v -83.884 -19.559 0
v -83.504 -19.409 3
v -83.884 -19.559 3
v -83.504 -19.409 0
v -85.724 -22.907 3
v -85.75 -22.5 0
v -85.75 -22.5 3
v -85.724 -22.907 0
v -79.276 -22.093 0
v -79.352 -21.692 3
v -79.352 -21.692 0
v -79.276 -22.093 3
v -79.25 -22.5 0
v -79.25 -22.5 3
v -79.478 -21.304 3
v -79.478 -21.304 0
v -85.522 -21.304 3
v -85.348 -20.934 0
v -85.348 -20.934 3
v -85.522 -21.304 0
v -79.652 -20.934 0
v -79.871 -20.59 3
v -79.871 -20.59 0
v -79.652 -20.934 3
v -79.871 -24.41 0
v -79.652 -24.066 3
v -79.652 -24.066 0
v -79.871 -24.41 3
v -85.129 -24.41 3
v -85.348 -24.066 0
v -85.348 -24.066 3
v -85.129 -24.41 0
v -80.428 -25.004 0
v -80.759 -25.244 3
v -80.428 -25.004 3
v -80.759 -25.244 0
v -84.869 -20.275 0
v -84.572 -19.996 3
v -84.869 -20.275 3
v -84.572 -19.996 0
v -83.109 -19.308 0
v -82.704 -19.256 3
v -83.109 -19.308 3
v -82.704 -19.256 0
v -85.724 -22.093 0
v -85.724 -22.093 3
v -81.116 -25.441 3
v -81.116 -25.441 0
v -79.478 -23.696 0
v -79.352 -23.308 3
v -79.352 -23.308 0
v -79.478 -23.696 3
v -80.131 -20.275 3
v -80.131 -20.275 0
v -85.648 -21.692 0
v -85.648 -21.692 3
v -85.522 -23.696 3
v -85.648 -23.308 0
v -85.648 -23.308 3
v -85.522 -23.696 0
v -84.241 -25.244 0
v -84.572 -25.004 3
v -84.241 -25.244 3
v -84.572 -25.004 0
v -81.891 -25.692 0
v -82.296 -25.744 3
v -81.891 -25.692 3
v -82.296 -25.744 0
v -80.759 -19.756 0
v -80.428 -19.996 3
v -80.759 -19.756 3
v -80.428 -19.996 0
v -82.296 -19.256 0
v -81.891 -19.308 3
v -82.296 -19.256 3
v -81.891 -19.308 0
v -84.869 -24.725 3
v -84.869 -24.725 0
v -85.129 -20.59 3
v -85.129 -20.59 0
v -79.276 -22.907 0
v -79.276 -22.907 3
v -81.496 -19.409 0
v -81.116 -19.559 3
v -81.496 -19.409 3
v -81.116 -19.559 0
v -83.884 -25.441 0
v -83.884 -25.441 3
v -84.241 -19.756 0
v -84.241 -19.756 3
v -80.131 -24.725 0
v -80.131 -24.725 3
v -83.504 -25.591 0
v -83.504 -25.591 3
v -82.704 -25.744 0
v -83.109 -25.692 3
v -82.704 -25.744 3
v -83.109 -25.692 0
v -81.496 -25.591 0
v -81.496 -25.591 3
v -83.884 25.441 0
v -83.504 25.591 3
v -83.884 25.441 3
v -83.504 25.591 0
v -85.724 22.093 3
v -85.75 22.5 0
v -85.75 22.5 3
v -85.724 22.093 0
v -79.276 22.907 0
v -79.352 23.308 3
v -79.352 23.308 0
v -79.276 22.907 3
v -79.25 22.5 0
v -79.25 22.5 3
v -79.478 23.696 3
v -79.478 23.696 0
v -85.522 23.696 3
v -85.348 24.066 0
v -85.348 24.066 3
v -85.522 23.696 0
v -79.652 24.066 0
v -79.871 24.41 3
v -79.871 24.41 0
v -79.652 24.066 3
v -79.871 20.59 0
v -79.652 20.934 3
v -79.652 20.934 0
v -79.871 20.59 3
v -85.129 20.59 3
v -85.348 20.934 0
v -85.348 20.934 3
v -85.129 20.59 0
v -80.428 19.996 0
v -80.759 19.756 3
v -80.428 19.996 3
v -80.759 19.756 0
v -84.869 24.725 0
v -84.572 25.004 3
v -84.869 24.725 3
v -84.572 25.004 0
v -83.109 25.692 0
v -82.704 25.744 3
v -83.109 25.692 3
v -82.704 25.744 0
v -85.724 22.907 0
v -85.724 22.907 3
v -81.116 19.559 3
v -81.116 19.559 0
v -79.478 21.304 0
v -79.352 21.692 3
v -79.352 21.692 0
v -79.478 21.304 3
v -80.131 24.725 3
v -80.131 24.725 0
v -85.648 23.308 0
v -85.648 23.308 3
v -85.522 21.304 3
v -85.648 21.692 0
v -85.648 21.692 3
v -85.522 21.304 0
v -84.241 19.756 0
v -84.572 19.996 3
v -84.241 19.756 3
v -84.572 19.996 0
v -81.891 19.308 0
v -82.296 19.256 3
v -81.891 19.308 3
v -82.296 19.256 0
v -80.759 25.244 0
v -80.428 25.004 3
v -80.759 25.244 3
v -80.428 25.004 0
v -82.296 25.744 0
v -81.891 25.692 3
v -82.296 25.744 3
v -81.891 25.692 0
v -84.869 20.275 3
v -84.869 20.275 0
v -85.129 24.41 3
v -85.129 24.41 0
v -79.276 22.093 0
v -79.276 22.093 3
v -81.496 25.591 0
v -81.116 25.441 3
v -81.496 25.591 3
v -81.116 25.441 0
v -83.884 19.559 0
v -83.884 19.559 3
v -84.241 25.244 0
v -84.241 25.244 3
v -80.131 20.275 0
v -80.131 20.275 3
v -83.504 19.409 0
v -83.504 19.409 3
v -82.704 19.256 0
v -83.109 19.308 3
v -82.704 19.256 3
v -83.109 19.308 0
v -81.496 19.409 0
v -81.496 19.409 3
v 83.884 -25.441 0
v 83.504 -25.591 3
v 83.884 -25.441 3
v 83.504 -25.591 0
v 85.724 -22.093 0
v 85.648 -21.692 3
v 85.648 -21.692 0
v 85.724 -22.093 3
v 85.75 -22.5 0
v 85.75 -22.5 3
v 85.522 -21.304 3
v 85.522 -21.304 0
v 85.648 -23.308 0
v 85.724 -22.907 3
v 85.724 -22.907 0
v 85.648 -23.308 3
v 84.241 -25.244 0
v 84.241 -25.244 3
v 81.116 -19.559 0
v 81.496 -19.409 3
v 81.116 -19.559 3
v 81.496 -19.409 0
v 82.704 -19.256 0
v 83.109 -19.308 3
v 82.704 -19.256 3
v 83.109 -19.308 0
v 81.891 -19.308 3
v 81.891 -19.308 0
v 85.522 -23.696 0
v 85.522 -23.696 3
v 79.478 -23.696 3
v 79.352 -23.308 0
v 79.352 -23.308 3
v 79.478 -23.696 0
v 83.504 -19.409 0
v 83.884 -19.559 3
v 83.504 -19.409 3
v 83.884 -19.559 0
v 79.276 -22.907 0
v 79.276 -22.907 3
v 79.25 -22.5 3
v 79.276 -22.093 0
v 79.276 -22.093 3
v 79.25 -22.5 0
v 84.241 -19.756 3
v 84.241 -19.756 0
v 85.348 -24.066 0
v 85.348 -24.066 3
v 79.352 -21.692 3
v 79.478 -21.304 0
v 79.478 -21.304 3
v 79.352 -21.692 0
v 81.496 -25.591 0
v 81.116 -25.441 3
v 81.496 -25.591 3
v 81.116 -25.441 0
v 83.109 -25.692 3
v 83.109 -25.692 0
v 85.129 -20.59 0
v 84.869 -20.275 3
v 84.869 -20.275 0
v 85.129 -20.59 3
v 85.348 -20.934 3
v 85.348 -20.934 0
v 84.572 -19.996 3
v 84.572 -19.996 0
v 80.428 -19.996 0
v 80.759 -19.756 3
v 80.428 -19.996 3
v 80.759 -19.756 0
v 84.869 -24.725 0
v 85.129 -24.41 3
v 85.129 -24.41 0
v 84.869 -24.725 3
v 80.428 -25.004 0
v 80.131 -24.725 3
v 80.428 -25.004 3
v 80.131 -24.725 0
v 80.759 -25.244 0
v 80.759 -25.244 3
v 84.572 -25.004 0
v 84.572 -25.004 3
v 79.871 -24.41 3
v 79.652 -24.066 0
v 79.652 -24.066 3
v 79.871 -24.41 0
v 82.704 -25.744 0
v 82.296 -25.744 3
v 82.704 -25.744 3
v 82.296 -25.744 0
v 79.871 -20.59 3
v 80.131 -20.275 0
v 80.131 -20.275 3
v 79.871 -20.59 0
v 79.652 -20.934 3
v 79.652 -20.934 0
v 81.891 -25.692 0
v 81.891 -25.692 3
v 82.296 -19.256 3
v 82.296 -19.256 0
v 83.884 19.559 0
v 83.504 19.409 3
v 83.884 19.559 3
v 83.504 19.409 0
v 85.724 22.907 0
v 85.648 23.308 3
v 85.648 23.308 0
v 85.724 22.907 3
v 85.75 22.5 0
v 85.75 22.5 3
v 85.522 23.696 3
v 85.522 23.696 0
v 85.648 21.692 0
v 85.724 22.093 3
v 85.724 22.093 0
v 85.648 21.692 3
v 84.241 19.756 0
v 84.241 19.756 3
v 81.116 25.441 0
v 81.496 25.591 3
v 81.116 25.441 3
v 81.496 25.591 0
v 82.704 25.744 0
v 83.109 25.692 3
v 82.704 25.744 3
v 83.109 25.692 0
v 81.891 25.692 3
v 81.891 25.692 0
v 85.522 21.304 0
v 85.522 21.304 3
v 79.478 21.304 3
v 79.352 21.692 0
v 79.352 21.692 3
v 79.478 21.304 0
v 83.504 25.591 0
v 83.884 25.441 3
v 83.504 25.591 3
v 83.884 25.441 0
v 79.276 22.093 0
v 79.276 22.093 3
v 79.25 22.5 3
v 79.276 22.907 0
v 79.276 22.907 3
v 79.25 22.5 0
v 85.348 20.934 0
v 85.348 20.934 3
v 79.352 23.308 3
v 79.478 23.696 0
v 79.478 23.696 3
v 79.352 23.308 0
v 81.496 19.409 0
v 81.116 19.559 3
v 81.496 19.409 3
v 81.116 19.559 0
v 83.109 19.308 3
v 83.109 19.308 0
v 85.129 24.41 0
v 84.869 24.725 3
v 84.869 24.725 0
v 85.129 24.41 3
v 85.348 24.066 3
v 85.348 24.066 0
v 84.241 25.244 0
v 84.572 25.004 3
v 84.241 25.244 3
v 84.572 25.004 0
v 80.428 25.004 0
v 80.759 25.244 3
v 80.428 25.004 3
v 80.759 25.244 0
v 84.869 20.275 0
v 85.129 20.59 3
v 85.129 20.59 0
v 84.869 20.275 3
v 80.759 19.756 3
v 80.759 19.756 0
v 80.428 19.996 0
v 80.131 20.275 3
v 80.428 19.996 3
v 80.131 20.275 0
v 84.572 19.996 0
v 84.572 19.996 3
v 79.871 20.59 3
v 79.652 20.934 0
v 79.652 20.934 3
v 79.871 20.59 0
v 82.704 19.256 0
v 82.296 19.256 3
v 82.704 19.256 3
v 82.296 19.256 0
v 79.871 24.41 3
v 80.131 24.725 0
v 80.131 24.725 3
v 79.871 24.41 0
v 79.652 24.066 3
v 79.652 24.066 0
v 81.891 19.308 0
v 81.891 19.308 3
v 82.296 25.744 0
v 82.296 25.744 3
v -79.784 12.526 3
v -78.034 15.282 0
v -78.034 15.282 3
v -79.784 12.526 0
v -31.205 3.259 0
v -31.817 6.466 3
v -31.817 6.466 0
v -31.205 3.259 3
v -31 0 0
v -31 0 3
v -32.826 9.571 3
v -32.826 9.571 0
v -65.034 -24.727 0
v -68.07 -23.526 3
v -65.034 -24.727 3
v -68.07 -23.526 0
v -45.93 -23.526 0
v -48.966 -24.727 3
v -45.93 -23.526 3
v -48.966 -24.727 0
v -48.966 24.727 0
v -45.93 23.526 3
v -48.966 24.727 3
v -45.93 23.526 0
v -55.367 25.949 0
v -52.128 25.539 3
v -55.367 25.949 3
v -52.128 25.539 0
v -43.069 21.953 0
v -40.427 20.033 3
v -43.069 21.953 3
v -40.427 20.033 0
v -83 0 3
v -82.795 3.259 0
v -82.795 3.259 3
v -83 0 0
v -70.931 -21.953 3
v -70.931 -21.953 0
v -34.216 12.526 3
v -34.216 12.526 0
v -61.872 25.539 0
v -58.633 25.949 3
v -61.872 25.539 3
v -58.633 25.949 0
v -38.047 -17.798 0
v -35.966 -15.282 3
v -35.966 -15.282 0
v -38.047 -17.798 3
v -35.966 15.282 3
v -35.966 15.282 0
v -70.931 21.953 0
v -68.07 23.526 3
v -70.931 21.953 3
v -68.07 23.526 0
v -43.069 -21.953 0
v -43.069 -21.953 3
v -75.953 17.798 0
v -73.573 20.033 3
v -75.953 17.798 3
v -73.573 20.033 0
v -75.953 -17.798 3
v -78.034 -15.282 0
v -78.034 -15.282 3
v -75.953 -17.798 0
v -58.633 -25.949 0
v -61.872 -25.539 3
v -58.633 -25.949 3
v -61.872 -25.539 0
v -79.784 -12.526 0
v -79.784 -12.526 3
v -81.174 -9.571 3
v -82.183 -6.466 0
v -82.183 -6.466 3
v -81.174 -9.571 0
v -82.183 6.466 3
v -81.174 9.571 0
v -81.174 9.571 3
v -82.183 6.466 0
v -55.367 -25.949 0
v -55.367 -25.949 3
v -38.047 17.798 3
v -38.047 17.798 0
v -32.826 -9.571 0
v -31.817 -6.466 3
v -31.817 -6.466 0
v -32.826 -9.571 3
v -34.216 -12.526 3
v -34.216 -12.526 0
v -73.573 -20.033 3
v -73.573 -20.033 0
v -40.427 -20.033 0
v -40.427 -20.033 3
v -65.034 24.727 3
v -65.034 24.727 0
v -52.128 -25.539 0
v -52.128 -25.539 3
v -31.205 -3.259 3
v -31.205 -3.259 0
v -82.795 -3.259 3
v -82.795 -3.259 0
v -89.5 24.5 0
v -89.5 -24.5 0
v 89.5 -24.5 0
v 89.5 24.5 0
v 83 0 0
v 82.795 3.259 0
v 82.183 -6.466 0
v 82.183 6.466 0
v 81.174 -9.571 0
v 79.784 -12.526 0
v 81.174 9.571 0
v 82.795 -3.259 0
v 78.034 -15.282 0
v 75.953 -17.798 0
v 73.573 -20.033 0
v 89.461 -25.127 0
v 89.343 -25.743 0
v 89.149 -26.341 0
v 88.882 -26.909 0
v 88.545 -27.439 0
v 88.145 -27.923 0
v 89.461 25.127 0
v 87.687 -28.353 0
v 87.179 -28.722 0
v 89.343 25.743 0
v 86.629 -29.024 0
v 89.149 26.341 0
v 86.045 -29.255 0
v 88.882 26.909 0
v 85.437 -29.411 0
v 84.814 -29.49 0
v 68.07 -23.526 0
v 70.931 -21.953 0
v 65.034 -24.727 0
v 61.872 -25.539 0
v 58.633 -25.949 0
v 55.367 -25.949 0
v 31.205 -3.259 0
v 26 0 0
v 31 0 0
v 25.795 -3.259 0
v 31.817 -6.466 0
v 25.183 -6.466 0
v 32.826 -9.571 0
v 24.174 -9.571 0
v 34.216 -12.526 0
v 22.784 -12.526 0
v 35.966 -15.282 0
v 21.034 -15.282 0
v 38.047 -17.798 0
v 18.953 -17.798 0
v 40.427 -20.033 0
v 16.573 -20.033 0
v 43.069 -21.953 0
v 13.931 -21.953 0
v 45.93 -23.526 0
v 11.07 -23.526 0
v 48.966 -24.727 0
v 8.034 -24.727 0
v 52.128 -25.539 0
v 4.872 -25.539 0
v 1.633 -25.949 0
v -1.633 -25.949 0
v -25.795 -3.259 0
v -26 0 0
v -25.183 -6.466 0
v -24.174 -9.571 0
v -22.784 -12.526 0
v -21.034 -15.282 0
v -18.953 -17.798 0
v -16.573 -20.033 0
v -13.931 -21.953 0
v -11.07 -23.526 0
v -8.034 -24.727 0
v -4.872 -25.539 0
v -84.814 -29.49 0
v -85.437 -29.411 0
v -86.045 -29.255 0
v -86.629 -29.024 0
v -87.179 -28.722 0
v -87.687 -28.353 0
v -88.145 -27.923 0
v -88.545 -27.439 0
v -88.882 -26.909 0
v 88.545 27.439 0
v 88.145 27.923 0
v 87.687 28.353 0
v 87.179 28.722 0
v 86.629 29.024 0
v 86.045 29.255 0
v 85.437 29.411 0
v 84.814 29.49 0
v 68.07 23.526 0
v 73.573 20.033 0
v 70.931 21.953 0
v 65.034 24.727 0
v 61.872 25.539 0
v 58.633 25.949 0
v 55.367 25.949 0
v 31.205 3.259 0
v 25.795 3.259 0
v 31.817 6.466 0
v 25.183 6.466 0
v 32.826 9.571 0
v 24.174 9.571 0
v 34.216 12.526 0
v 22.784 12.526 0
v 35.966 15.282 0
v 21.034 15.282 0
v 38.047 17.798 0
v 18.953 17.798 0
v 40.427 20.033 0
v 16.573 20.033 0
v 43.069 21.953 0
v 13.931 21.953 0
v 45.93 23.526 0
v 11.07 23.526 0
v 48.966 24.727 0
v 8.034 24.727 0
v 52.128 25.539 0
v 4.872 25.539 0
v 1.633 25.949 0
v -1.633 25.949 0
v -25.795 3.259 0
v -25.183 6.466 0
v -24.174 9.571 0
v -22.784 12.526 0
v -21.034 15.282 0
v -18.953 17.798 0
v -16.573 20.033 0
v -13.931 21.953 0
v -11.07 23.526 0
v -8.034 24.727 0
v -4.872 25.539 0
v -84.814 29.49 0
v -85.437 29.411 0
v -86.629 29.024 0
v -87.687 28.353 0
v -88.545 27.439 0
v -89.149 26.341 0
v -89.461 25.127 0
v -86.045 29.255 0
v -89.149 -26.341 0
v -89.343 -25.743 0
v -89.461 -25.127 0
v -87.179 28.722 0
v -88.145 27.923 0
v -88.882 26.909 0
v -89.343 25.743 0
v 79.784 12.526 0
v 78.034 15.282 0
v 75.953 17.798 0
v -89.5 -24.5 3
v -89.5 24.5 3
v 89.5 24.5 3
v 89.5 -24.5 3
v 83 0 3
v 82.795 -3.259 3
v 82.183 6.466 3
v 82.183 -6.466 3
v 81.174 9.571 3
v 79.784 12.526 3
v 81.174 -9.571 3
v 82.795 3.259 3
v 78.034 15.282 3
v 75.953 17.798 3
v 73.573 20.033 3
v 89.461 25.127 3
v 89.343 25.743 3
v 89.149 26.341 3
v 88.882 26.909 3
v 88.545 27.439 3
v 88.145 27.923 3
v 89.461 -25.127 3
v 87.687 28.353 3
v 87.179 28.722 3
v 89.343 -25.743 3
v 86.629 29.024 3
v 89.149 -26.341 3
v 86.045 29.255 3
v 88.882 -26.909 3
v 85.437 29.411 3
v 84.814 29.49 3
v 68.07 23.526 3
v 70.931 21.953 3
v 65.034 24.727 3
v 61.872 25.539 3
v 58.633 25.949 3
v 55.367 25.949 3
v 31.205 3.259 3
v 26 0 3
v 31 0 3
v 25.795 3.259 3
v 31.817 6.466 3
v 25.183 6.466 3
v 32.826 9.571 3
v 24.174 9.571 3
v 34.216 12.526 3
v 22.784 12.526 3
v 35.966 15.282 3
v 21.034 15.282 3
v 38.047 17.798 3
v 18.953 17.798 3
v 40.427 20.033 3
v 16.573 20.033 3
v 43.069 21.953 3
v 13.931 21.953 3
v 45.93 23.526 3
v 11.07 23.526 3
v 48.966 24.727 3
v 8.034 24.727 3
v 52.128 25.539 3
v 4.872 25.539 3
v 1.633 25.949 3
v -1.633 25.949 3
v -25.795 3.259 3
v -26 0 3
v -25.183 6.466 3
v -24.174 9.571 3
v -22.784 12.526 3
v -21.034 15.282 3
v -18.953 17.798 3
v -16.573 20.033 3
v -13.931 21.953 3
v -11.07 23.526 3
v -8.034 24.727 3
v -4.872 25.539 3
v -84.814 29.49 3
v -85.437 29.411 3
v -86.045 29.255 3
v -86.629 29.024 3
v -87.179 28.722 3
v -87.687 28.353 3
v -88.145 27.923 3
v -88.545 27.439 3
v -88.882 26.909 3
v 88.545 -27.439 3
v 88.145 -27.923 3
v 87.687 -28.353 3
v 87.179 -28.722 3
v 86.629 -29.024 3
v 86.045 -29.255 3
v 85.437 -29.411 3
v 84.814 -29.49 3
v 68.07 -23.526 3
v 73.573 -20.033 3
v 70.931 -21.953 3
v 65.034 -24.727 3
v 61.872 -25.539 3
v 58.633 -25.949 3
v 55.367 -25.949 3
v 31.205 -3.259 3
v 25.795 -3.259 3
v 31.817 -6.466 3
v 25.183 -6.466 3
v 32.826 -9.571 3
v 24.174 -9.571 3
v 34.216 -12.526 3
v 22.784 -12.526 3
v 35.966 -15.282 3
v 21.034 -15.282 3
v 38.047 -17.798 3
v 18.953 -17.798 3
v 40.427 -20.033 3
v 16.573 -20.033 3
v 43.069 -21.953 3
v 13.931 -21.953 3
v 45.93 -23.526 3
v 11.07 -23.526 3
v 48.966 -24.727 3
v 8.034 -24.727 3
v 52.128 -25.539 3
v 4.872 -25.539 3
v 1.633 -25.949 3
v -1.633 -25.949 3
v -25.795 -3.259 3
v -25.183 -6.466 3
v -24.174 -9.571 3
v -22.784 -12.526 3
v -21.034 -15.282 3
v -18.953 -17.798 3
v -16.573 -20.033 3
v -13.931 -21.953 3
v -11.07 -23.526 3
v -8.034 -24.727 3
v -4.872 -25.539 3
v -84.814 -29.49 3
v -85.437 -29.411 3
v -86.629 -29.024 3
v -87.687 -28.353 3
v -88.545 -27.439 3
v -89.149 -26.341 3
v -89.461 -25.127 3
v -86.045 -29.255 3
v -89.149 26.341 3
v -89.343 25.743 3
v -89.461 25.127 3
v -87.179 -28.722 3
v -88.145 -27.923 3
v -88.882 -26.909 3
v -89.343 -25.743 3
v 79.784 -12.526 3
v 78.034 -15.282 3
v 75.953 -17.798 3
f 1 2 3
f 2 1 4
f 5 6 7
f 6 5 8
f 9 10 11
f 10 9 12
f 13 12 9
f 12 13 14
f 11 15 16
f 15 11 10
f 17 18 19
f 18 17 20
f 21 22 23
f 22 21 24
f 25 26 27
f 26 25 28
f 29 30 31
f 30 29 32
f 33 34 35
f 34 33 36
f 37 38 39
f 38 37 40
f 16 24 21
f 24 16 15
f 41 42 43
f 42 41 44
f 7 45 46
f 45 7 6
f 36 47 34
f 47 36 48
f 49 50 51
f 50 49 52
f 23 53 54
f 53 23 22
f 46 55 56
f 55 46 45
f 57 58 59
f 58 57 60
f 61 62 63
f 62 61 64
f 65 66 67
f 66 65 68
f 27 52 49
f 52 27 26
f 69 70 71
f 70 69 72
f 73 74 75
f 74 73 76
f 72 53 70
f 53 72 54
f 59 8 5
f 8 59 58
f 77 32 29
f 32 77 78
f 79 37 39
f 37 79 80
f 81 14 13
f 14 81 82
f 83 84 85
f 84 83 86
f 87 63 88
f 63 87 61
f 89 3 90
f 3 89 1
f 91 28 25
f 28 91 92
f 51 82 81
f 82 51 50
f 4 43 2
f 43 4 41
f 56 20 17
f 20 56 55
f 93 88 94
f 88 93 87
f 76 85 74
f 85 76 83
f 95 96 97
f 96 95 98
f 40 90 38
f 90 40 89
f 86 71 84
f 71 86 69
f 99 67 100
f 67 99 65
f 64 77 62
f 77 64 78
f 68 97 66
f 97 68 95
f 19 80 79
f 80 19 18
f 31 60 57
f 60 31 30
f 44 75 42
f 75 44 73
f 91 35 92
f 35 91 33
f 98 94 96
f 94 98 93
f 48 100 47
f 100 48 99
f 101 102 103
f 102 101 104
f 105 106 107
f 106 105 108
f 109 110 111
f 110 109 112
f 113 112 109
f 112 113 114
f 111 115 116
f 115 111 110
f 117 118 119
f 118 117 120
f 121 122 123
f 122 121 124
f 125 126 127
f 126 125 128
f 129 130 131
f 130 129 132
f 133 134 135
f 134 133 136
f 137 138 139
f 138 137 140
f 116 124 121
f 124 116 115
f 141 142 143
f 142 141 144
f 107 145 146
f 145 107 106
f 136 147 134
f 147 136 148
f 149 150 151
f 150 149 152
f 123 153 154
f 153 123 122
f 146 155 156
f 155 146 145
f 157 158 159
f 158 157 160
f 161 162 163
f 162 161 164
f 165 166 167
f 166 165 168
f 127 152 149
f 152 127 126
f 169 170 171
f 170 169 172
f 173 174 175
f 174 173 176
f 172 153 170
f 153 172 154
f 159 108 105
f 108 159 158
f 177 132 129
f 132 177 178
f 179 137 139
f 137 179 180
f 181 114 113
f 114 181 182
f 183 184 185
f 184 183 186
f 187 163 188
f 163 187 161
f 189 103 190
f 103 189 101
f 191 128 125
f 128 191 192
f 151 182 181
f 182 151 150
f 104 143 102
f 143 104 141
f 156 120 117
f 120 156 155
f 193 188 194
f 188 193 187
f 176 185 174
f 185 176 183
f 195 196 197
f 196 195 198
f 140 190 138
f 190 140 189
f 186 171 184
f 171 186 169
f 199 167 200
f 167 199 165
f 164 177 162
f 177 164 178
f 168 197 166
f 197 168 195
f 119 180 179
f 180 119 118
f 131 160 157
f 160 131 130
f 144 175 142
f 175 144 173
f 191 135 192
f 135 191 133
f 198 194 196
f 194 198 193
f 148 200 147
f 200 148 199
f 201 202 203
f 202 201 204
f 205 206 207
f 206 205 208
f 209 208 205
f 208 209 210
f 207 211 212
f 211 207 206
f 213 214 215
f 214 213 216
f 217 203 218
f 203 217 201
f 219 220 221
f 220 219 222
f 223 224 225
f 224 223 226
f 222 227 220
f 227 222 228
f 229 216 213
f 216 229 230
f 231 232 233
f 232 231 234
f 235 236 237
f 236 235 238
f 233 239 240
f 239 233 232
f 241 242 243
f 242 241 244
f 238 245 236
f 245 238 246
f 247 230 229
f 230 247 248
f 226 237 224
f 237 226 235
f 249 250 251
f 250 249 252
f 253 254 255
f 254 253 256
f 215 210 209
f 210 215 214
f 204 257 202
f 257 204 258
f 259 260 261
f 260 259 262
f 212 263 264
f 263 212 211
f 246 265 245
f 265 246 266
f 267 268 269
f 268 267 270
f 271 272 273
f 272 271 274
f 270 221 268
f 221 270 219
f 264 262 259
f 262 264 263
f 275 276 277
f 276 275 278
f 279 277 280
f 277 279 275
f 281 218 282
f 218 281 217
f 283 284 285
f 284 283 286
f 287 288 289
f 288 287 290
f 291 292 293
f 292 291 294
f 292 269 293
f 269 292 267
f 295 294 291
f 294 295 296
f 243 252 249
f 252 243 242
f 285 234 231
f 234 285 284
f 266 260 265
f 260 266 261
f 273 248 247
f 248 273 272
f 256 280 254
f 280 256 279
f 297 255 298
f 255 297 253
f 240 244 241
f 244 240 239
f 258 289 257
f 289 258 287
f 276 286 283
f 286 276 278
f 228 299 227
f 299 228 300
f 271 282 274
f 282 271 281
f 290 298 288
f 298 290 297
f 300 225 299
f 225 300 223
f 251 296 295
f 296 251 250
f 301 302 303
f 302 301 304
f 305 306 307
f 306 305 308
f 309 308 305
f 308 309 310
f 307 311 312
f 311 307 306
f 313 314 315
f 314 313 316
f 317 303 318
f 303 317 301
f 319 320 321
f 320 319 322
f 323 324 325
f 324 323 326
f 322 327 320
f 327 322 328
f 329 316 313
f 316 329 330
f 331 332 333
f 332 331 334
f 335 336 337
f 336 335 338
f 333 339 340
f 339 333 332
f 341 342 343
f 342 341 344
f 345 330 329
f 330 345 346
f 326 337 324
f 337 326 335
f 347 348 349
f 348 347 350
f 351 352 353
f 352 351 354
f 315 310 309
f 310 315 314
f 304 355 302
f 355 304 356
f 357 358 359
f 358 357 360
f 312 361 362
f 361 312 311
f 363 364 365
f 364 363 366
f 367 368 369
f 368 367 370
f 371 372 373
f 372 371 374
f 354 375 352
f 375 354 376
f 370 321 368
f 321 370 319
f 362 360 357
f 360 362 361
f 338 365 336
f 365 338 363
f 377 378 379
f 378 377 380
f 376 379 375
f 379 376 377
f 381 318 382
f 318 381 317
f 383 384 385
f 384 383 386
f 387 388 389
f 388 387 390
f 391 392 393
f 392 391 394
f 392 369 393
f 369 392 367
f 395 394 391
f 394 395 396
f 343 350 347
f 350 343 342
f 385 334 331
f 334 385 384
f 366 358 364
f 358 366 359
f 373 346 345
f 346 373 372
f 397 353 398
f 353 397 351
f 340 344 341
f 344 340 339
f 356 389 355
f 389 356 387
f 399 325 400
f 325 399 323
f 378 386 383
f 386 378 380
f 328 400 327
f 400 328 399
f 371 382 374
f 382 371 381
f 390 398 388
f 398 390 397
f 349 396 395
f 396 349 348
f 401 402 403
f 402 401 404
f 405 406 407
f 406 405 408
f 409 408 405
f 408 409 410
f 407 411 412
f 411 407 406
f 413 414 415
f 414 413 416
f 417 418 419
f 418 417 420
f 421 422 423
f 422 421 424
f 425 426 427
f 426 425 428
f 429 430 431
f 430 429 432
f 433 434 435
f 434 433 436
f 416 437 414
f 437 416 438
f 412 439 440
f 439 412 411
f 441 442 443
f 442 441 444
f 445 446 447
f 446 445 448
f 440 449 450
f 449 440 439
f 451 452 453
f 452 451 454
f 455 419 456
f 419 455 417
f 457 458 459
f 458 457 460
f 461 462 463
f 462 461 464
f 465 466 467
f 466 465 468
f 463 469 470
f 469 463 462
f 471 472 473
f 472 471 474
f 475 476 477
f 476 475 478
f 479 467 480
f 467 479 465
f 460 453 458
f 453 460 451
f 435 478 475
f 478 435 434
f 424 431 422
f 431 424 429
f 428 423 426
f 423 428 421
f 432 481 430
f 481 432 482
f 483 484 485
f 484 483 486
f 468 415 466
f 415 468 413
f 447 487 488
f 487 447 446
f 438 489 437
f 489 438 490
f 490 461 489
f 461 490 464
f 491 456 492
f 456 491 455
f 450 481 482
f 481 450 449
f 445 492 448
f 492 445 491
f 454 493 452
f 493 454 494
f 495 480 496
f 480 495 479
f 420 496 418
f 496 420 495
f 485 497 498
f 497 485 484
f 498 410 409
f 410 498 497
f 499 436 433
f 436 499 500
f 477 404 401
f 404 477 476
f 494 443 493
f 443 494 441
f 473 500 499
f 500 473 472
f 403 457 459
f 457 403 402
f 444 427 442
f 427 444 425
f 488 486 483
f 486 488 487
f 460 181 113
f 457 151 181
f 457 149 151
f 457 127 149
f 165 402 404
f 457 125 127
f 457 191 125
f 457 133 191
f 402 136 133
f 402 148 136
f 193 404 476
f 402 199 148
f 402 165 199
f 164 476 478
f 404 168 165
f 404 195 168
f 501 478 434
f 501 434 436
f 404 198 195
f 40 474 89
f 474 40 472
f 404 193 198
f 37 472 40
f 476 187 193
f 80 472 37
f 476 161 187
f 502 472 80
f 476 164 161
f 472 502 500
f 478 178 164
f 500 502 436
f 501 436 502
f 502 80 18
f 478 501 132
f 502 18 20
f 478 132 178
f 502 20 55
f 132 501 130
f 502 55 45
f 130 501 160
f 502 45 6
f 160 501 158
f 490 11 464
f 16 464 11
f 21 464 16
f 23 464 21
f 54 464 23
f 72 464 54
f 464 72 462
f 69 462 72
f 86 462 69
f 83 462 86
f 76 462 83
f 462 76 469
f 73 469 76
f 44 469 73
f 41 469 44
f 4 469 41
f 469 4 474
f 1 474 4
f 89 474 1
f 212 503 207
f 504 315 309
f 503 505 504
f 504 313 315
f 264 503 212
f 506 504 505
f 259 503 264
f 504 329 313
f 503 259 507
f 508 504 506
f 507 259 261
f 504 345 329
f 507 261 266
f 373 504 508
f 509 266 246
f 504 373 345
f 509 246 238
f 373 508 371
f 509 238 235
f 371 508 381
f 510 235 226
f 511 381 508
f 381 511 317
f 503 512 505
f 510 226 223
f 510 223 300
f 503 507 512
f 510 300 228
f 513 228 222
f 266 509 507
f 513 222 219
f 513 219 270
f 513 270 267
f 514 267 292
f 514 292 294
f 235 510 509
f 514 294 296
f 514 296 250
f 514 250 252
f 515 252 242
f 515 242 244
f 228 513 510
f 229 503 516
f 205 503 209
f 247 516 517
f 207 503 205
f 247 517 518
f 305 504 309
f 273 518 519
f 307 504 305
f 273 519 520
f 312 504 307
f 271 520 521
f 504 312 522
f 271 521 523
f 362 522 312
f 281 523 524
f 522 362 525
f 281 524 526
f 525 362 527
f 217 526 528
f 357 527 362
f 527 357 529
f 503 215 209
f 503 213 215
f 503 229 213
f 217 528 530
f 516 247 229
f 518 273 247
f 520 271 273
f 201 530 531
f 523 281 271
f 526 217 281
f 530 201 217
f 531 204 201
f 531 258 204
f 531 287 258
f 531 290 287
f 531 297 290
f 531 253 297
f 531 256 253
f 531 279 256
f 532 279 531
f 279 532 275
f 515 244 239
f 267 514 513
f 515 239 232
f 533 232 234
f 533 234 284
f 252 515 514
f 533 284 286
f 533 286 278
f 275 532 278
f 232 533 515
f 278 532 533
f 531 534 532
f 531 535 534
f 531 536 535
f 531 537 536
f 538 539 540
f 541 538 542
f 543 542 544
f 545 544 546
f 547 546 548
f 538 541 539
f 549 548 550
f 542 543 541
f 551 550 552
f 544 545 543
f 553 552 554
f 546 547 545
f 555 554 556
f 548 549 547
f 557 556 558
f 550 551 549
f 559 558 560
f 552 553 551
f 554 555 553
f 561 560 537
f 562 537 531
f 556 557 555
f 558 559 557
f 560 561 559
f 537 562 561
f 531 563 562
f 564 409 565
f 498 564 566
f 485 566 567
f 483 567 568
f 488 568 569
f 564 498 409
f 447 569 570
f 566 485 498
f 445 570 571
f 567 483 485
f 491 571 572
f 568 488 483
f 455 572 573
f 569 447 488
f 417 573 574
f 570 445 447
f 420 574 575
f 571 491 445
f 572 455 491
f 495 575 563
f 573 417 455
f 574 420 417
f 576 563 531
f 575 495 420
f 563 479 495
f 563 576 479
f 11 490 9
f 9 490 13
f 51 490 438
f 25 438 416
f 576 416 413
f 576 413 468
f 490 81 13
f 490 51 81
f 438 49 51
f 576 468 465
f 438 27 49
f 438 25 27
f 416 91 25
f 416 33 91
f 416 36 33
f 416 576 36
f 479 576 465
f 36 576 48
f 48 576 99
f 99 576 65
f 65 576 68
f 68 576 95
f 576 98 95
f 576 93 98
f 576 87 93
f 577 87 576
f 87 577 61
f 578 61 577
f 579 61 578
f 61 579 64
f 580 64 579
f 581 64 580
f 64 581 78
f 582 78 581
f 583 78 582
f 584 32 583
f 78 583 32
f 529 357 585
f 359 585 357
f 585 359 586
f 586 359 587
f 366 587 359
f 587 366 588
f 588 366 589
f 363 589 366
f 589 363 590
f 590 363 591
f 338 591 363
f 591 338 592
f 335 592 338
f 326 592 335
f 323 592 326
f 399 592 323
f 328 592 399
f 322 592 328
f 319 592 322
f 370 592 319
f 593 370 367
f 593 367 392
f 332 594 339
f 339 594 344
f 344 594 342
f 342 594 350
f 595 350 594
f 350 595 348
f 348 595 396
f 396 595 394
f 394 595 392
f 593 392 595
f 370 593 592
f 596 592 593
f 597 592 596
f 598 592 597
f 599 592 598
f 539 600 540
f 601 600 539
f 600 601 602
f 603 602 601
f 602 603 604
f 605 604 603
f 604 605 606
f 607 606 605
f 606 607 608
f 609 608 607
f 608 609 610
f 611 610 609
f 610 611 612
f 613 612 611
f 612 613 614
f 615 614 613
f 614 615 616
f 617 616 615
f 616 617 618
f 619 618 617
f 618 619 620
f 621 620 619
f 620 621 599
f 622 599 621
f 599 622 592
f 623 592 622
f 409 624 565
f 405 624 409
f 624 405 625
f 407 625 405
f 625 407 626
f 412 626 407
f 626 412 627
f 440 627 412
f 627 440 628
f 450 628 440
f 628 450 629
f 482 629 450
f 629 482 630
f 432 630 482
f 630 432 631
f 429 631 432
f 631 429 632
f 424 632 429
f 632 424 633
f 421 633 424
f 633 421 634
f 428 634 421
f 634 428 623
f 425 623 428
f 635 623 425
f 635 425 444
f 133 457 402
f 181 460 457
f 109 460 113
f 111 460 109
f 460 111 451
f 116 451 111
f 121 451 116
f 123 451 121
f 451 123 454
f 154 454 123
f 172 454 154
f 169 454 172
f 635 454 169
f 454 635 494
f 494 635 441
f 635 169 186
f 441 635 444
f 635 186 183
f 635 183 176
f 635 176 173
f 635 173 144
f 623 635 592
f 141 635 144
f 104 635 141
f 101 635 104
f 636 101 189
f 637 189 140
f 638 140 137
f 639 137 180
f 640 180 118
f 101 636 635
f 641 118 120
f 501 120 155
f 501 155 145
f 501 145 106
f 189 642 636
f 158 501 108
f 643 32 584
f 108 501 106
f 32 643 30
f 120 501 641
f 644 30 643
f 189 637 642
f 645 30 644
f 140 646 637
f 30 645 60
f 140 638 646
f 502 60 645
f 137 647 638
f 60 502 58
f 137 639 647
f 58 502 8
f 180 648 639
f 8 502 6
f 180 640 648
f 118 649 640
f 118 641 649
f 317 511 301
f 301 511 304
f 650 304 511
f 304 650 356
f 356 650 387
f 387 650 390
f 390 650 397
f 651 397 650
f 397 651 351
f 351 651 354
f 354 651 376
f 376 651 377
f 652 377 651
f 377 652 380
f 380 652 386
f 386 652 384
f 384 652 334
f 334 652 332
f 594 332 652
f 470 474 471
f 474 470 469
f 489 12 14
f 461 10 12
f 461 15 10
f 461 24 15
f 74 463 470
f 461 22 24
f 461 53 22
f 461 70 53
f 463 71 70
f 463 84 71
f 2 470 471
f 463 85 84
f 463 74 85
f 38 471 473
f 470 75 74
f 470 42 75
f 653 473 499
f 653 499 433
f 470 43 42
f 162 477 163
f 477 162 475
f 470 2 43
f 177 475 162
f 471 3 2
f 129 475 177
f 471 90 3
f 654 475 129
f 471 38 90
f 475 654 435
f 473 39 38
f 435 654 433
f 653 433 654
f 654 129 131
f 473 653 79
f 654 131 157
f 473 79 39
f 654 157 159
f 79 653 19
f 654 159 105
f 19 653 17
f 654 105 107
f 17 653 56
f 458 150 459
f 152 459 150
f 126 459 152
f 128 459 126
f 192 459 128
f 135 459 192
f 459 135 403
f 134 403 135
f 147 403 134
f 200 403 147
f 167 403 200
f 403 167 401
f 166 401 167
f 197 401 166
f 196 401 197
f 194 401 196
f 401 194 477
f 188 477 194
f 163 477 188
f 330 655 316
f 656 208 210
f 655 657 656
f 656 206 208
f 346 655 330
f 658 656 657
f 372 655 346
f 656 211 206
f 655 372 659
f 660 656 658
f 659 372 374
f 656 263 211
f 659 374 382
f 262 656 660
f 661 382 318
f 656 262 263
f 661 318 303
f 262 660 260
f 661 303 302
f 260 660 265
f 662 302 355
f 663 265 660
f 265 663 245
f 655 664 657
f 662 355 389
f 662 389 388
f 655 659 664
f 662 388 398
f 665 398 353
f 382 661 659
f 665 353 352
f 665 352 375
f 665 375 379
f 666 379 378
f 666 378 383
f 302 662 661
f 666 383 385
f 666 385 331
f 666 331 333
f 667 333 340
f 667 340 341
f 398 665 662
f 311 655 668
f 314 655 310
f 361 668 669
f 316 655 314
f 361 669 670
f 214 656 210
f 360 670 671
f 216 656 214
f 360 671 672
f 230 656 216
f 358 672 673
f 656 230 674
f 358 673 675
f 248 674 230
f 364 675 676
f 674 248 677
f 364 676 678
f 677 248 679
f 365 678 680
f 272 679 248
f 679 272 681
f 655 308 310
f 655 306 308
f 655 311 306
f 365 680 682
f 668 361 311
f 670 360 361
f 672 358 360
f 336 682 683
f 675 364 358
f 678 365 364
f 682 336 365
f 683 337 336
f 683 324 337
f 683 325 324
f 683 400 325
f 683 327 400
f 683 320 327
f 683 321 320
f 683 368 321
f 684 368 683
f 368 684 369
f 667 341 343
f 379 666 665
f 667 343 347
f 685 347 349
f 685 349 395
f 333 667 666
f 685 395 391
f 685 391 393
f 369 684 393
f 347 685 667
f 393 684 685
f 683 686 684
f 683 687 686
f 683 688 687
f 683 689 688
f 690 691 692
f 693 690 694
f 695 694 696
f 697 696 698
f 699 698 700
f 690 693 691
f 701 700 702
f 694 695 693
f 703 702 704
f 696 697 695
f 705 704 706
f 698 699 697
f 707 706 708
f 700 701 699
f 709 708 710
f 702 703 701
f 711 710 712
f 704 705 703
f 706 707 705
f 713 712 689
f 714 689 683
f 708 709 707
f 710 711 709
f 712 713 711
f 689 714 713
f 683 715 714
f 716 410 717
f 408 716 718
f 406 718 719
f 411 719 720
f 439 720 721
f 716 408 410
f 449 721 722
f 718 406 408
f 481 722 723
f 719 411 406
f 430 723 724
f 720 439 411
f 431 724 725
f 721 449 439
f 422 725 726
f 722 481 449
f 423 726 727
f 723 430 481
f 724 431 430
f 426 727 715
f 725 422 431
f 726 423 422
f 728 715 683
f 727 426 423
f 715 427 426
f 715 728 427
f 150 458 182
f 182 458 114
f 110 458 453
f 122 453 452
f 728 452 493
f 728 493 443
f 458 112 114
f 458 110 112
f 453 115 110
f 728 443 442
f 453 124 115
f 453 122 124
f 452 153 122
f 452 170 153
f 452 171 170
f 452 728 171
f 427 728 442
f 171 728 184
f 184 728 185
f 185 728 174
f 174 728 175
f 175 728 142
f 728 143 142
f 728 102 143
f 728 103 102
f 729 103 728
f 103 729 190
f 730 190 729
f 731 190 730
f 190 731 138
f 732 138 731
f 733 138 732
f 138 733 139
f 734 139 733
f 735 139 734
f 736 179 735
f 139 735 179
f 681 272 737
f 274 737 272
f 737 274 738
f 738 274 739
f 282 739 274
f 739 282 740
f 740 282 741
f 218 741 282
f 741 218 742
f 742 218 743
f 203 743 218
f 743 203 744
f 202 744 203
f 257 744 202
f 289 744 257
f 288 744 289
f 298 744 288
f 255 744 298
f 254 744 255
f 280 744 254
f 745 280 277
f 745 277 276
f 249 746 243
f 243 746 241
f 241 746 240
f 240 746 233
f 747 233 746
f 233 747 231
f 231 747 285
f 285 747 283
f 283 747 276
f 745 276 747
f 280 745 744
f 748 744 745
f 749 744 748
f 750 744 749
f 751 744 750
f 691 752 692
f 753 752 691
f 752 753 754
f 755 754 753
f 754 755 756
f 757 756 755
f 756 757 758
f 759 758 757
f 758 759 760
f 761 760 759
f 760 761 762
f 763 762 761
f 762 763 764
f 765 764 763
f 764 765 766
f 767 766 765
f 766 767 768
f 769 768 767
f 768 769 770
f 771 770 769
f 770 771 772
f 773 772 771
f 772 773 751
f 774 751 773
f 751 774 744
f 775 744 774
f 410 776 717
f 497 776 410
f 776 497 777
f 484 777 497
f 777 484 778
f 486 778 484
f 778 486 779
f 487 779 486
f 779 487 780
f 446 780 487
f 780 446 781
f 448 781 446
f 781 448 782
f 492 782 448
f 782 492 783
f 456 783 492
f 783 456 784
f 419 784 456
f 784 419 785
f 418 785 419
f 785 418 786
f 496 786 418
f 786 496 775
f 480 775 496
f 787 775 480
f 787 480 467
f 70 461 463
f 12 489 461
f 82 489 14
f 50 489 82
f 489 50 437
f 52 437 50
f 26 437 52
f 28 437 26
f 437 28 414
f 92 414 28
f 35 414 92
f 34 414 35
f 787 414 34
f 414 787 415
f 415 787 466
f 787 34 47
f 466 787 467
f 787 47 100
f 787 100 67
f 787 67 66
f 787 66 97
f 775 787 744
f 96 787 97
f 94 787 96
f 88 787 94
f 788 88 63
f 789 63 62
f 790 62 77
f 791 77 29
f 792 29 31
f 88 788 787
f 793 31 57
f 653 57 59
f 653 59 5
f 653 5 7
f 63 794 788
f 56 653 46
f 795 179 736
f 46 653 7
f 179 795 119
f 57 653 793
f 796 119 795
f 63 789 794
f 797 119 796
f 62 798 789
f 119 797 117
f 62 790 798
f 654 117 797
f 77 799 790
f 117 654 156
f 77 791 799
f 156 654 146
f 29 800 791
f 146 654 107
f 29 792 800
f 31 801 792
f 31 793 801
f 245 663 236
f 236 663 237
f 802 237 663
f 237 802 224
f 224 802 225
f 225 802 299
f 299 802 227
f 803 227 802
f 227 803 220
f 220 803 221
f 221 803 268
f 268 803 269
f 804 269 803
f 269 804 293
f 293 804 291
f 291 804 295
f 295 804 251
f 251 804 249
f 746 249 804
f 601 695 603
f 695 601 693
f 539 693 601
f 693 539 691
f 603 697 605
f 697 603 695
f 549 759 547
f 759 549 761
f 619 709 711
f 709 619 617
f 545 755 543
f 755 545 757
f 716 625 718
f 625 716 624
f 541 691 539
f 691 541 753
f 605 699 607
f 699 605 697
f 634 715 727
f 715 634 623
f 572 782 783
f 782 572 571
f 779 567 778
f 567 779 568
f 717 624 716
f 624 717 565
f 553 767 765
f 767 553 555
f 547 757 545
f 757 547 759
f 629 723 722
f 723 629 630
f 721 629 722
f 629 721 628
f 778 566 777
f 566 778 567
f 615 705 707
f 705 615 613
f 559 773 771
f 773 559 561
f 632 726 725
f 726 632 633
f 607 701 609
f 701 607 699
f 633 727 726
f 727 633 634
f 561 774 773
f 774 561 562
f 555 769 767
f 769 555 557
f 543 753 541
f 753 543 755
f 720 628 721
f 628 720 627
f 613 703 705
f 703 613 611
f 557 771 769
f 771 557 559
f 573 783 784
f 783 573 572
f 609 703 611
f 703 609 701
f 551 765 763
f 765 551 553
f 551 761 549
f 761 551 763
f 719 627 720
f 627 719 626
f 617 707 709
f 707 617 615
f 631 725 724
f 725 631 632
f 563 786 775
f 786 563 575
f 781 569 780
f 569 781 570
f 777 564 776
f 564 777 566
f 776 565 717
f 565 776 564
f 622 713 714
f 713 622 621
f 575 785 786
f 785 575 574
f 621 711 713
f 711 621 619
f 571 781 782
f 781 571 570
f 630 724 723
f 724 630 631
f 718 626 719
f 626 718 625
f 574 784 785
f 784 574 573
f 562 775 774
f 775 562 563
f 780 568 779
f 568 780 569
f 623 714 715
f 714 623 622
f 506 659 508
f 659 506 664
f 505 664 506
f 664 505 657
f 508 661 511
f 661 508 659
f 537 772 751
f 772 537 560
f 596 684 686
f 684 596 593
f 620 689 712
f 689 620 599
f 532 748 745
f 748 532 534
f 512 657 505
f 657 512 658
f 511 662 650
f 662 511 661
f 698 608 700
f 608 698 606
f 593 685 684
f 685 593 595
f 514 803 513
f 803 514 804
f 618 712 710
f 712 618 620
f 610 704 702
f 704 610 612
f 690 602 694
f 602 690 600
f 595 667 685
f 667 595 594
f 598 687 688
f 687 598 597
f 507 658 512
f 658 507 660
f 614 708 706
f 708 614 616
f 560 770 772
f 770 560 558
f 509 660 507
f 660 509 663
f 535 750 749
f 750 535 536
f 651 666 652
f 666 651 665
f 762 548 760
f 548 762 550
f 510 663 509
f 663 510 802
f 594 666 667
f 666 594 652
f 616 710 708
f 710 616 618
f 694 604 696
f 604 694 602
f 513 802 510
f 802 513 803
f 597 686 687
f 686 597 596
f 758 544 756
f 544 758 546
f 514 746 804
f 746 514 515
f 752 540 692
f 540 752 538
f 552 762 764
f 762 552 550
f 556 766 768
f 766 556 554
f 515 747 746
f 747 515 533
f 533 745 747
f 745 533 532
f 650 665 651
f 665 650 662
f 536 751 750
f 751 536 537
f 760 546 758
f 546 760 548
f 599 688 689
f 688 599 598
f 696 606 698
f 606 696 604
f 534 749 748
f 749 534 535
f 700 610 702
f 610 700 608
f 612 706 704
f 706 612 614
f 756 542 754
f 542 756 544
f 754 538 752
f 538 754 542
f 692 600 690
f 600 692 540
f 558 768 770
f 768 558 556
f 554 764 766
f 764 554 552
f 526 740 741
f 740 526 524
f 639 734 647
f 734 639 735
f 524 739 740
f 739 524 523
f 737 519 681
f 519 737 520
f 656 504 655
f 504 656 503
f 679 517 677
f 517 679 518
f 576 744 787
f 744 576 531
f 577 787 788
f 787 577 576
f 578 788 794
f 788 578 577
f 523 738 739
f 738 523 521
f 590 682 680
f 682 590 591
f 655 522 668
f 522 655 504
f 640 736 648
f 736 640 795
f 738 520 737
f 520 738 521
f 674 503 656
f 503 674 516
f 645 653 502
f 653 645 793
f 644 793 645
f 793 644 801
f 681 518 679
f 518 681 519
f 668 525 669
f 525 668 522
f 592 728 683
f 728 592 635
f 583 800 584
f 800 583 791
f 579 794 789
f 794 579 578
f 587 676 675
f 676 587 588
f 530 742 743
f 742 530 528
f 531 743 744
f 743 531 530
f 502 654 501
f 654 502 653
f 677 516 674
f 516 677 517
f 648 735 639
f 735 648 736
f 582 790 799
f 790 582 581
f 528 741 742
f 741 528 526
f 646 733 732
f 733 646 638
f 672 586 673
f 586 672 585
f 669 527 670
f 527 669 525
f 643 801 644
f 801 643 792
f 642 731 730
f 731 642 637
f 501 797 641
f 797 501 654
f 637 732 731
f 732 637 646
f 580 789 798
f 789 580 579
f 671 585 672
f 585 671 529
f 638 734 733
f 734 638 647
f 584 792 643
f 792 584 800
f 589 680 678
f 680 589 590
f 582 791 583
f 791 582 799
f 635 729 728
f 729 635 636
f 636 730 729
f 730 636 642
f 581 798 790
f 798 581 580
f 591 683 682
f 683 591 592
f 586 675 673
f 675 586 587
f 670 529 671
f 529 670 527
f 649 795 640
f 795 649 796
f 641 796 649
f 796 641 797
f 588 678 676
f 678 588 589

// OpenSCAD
$fn = 50;

difference() {
	union() {
		hull() {
			translate(v = [-84.5, 24.5, 0]) {
				cylinder(h = 3, r = 5);
			}
			translate(v = [84.5, 24.5, 0]) {
				cylinder(h = 3, r = 5);
			}
			translate(v = [-84.5, -24.5, 0]) {
				cylinder(h = 3, r = 5);
			}
			translate(v = [84.5, -24.5, 0]) {
				cylinder(h = 3, r = 5);
			}
		}
	}
	union() {
		translate(v = [-82.5, -22.5, -100.0]) {
			cylinder(h = 200, r = 3.25);
		}
		translate(v = [-82.5, 22.5, -100.0]) {
			cylinder(h = 200, r = 3.25);
		}
		translate(v = [82.5, -22.5, -100.0]) {
			cylinder(h = 200, r = 3.25);
		}
		translate(v = [82.5, 22.5, -100.0]) {
			cylinder(h = 200, r = 3.25);
		}
		translate(v = [-82.5, -22.5, -100.0]) {
			cylinder(h = 200, r = 1.8);
		}
		translate(v = [-82.5, 22.5, -100.0]) {
			cylinder(h = 200, r = 1.8);
		}
		translate(v = [82.5, -22.5, -100.0]) {
			cylinder(h = 200, r = 1.8);
		}
		translate(v = [82.5, 22.5, -100.0]) {
			cylinder(h = 200, r = 1.8);
		}
		translate(v = [-57.0, 0, 0.0]) {
			cylinder(h = 3, r = 26.0);
		}
		cylinder(h = 3, r = 26.0);
		translate(v = [57.0, 0, 0.0]) {
			cylinder(h = 3, r = 26.0);
		}
	}
}
